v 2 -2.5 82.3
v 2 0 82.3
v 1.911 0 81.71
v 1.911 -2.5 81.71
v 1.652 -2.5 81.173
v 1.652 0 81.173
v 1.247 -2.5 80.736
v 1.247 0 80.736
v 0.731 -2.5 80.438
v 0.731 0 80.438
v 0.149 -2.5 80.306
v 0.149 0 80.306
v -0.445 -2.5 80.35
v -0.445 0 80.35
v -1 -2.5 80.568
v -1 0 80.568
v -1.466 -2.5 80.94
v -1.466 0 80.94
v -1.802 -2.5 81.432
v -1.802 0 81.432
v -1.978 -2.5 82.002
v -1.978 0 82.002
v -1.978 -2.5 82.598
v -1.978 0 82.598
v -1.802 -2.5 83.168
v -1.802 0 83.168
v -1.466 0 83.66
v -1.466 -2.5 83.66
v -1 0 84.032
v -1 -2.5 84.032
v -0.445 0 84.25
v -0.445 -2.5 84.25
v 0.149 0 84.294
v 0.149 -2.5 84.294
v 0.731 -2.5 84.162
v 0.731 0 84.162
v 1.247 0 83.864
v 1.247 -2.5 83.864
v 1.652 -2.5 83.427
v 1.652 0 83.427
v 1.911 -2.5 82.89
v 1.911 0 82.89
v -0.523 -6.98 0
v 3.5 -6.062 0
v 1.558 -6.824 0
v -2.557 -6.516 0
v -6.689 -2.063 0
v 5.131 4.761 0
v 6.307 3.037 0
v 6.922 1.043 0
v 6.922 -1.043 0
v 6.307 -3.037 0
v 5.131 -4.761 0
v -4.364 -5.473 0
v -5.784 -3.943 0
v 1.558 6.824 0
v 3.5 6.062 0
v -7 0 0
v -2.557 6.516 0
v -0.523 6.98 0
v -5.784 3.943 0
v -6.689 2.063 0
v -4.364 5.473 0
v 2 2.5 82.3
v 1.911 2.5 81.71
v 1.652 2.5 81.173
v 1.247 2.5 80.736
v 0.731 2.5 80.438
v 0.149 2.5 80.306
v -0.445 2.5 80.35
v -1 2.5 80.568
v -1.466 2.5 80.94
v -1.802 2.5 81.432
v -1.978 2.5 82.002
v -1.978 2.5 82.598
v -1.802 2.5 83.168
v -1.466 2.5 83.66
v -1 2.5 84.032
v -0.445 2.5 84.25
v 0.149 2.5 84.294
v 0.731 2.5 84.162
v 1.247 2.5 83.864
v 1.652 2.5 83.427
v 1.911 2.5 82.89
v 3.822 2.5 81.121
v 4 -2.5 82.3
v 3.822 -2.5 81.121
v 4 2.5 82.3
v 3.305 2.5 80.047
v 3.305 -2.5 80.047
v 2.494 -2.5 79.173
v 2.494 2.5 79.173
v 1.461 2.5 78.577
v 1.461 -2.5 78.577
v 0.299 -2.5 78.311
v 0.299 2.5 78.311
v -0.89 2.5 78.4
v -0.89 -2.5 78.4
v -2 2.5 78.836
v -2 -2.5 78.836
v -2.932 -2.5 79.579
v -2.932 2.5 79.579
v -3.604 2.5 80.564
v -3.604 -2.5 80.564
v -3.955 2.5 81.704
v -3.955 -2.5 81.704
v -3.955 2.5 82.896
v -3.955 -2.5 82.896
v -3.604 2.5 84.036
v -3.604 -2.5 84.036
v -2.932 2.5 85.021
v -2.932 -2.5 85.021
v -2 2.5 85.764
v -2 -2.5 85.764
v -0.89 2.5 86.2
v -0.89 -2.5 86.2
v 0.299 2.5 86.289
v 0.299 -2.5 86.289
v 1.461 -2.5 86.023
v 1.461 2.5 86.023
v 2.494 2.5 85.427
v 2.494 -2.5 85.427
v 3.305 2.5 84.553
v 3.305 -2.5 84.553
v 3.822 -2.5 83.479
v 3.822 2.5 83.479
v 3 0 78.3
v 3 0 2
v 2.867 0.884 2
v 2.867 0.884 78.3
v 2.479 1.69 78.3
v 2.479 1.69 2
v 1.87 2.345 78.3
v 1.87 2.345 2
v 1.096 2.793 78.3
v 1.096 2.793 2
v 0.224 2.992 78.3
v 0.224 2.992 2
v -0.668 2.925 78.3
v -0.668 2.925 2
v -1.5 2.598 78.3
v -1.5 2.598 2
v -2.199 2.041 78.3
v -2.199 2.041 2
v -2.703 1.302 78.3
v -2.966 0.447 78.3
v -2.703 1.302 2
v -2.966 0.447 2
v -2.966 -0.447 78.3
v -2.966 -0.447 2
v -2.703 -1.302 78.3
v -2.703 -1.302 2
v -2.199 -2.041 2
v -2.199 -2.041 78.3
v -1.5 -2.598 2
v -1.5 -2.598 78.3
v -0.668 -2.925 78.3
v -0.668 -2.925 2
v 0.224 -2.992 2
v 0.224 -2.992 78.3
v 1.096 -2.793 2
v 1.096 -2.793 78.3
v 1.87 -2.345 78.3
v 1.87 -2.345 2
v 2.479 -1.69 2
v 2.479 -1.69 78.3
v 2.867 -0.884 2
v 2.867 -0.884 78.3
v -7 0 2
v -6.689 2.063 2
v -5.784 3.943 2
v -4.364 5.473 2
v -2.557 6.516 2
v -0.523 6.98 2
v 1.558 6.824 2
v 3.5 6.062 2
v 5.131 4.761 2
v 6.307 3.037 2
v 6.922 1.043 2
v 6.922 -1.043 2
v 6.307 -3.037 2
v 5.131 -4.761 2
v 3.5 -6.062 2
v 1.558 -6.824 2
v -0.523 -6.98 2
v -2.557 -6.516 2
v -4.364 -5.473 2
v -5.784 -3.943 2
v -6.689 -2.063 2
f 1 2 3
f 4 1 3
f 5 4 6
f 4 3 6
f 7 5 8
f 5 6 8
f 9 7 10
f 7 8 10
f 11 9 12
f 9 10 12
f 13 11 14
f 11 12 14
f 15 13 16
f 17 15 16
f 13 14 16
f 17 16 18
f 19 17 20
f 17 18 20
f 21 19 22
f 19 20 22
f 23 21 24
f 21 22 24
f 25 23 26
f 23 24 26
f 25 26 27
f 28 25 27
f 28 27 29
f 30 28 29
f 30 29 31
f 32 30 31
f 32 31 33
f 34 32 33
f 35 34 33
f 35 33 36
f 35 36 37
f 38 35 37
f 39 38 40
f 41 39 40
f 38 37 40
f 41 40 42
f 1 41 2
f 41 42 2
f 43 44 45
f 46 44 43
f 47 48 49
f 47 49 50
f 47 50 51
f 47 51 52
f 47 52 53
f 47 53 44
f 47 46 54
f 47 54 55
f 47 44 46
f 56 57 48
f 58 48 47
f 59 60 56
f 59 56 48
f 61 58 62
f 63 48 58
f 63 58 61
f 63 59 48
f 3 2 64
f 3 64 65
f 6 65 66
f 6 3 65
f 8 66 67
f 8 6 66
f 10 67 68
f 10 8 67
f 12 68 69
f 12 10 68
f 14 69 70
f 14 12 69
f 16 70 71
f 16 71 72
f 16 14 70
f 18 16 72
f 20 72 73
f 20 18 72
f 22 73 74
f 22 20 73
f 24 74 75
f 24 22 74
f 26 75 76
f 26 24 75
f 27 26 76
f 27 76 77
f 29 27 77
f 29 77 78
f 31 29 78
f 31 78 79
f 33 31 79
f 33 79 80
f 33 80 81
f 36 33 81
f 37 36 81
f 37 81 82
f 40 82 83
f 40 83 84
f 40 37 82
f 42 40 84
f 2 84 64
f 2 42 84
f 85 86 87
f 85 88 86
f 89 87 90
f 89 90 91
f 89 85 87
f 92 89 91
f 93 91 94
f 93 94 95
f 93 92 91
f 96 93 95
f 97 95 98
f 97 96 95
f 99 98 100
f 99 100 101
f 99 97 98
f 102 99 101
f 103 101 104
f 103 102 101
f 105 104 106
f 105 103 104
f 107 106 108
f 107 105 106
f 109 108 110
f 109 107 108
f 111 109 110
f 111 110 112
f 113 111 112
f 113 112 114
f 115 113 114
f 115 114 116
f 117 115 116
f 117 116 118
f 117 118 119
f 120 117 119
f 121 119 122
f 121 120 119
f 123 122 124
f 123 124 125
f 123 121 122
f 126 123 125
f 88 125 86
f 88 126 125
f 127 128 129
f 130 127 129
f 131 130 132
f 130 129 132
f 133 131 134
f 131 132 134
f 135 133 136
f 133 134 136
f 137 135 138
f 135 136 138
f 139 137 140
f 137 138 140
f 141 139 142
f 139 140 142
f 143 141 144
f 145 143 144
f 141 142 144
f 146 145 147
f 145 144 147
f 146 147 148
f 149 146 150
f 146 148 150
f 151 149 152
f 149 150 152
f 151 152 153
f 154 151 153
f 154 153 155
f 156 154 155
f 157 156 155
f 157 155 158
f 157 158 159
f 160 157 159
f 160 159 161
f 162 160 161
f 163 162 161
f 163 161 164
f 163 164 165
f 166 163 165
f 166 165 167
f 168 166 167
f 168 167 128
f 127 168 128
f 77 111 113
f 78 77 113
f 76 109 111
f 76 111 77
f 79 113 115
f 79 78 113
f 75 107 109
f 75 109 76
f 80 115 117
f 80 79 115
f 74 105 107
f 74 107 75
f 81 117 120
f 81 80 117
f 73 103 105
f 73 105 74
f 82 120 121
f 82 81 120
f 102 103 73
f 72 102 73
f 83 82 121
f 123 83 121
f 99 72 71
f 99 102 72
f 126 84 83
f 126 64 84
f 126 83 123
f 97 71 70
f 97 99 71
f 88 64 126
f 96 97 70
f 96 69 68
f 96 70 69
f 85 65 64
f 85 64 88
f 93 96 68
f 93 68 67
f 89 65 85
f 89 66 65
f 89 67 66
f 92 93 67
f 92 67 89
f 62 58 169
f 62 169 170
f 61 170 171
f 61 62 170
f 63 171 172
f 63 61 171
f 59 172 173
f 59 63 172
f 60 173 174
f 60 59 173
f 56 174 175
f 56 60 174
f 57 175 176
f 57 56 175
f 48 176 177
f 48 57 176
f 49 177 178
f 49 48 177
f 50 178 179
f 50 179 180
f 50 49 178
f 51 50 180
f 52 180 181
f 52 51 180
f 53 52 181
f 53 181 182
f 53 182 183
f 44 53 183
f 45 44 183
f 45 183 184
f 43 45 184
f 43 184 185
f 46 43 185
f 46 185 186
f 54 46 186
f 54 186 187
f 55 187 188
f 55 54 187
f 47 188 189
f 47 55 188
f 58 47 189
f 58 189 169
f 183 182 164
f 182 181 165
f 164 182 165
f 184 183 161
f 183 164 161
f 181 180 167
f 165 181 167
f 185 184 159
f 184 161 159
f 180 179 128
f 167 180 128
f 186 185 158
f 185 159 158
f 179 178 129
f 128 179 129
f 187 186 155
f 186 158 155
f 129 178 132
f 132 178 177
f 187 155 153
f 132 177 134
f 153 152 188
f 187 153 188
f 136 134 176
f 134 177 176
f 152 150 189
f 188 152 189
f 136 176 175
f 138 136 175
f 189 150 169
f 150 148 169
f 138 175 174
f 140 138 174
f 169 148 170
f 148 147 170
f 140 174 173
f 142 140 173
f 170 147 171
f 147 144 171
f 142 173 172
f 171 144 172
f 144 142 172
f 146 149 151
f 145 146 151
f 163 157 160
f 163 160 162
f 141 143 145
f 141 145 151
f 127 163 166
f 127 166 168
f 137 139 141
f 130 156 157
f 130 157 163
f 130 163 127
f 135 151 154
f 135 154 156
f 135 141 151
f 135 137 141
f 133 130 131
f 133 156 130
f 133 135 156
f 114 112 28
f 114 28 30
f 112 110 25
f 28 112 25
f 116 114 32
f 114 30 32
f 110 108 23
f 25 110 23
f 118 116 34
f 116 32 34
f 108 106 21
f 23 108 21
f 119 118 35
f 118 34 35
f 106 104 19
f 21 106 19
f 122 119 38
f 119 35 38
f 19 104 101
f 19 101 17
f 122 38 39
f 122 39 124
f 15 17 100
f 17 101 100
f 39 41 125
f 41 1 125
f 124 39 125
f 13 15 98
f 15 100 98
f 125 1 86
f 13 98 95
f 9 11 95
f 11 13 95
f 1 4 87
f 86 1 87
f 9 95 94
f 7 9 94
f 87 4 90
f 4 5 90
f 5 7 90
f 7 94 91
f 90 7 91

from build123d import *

# Parameters (mm, degrees)
SKETCH1_R                = 3
BOSS_EXTRUDE1_DEPTH      = 78.3
BOSS_EXTRUDE2_DEPTH      = 2.5
BOSS_EXTRUDE2_DEPTH_BACK = 2.5
SKETCH2_R                = 4
SKETCH2_R_2              = 2
SKETCH3_R                = 7
BOSS_EXTRUDE3_DEPTH      = 2


with BuildPart() as part:
    # Sketch1 → Boss-Extrude1 (new body)
    with BuildSketch(Plane.XY):
        Circle(SKETCH1_R)
    extrude(amount=BOSS_EXTRUDE1_DEPTH)

    # Sketch3 → Boss-Extrude3 (add)
    with BuildSketch(Plane(origin=(0, 0, 0), x_dir=(-1, 0, 0), z_dir=(0, 0, -1))):
        Circle(SKETCH3_R)
    extrude(amount=-BOSS_EXTRUDE3_DEPTH)


with BuildPart() as body_2:
    # Sketch2 → Boss-Extrude2 (new, two sides: drawn at the far end of the back side and taken through both)
    with BuildSketch(Plane(origin=(0, 0, 0), x_dir=(1, 0, 0), z_dir=(0, 1, 0)).offset(-BOSS_EXTRUDE2_DEPTH_BACK)):
        with Locations((0, -82.3)):
            Circle(SKETCH2_R)
        with Locations((0, -82.3)):
            Circle(SKETCH2_R_2, mode=Mode.SUBTRACT)
    extrude(amount=BOSS_EXTRUDE2_DEPTH + BOSS_EXTRUDE2_DEPTH_BACK)


solid = Compound([part.part, body_2.part])
